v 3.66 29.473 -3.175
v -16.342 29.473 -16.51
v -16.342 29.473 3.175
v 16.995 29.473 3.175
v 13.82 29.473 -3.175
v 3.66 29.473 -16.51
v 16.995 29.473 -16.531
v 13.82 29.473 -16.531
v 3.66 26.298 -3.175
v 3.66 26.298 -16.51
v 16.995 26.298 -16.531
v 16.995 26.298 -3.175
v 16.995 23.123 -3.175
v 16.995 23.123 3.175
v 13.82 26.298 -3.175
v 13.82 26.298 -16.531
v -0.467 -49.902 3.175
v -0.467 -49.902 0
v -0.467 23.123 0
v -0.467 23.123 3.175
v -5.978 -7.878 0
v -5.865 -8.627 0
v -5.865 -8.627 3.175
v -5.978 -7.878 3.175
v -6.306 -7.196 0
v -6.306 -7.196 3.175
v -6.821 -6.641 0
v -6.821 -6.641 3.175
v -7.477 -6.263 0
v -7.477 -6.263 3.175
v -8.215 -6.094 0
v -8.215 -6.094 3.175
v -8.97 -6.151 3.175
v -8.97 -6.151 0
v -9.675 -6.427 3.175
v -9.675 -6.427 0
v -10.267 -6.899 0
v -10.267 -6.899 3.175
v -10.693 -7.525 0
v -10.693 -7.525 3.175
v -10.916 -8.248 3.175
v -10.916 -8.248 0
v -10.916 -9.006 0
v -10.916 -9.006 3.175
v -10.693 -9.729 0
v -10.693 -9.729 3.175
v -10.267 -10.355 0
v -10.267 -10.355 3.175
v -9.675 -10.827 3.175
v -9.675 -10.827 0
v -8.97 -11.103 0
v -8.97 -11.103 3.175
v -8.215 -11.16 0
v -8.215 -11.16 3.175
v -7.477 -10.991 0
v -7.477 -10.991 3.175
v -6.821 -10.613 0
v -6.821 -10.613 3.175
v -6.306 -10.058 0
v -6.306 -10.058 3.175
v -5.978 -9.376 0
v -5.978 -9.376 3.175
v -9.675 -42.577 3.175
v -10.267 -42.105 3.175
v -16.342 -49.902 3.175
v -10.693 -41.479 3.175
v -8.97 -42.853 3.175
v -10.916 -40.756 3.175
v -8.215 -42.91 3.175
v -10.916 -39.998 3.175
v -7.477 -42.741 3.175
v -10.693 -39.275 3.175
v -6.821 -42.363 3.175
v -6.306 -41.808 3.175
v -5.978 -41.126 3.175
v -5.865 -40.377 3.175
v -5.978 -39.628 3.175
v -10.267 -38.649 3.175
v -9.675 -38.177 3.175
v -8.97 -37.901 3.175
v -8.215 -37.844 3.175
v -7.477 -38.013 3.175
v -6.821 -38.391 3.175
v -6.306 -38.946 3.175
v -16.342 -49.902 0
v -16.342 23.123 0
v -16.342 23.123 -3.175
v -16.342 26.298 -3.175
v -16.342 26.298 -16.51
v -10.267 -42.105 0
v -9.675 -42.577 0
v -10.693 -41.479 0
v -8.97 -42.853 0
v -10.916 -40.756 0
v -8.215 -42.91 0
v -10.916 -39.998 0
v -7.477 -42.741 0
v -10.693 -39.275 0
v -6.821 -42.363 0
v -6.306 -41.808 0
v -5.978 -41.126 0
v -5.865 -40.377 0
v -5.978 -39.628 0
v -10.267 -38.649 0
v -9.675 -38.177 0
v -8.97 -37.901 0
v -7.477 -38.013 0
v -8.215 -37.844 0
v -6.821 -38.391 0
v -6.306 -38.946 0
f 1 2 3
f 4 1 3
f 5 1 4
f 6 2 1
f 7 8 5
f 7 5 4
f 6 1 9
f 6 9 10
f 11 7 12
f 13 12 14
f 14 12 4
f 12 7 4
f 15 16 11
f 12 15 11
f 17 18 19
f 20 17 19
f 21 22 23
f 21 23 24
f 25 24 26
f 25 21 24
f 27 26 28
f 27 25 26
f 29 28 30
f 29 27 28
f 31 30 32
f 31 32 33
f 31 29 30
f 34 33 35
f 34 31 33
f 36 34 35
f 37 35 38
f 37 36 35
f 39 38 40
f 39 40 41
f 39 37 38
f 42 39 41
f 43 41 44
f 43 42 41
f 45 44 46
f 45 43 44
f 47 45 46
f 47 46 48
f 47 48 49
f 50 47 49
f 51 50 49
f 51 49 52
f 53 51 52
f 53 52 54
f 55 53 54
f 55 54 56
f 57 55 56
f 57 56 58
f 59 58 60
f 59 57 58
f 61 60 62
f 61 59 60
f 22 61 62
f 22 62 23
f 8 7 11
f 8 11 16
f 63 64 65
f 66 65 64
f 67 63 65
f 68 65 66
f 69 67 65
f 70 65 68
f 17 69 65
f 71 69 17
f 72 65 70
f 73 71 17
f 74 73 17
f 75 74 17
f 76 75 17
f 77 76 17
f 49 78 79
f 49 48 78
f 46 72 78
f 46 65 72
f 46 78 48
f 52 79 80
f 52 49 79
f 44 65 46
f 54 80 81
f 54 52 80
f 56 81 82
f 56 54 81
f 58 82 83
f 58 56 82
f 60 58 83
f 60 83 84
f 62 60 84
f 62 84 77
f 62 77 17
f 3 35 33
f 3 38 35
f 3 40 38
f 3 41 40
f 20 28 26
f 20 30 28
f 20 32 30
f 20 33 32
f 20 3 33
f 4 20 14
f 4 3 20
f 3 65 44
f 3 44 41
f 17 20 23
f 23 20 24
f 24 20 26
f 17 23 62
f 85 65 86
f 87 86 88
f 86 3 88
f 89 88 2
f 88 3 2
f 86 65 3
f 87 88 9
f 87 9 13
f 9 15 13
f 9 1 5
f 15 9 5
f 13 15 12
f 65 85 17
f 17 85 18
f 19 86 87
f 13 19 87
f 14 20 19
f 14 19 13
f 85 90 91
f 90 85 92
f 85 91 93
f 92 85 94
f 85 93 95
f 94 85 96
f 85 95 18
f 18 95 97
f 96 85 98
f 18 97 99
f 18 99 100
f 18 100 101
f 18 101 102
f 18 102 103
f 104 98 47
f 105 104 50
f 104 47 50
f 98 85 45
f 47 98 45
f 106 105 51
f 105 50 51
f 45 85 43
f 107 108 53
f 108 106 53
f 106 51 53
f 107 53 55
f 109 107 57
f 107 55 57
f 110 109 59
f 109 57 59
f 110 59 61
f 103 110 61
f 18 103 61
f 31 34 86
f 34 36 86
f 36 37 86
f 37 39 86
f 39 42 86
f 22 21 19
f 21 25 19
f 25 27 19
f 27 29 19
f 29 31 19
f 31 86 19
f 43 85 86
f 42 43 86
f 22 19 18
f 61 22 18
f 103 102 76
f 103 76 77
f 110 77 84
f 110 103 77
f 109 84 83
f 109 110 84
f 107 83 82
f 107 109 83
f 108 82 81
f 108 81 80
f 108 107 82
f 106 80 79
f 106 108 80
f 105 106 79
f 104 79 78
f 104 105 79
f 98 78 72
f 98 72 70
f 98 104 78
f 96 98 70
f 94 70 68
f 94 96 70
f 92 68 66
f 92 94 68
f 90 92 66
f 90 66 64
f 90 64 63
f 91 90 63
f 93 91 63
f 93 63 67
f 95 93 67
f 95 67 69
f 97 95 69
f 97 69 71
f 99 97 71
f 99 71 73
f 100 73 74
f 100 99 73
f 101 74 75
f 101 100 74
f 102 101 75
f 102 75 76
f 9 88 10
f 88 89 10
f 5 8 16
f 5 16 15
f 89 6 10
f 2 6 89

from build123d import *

# Parameters (mm, degrees)
SKETCH1_W           = 15.875
SKETCH1_H           = 79.375
SKETCH1_R           = 2.54
BOSS_EXTRUDE1_DEPTH = 3.175
BOSS_EXTRUDE2_DEPTH = 3.175
SKETCH3_W           = 17.4625
SKETCH3_H           = 3.175
BOSS_EXTRUDE3_DEPTH = 3.175


with BuildPart() as part:
    # Sketch1 → Boss-Extrude1 (new body)
    with BuildSketch(Plane.XY):
        with Locations((-8.404682644, -10.214522003)):
            Rectangle(SKETCH1_W, SKETCH1_H)
        with Locations((-8.404682644, -8.627022003)):
            Circle(SKETCH1_R, mode=Mode.SUBTRACT)
        with Locations((-8.404682644, -40.377022003)):
            Circle(SKETCH1_R, mode=Mode.SUBTRACT)
    extrude(amount=BOSS_EXTRUDE1_DEPTH)

    # Sketch2 → Boss-Extrude2 (add)
    with BuildSketch(Plane(origin=(0, 29.472977997, 0), x_dir=(1, 0, 0), z_dir=(0, 1, 0))):
        Polygon((-0.467182644, 0), (3.660317356, 0), (3.660317356, 3.175), (3.660317356, 16.51), (-16.342182644, 16.51), (-16.342182644, 0), align=None)
        Polygon((16.995317356, 0), (3.660317356, 0), (-0.467182644, 0), (-0.467182644, -3.175), (16.995317356, -3.175), align=None)
        Polygon((3.660317356, 3.175), (3.660317356, 0), (16.995317356, 0), (16.995317356, 16.531210472), (13.820317356, 16.531210472), (13.820317356, 3.175), align=None)
    extrude(amount=-BOSS_EXTRUDE2_DEPTH)

    # Sketch3 → Boss-Extrude3 (add)
    with BuildSketch(Plane.XZ.offset(-26.297977997)):
        Polygon((-0.467182644, 0), (-16.342182644, 0), (-16.342182644, -3.175), (3.660317356, -3.175), (13.820317356, -3.175), (16.995317356, -3.175), (16.995317356, 0), align=None)
        with Locations((8.264067356, 1.5875)):
            Rectangle(SKETCH3_W, SKETCH3_H)
    extrude(amount=BOSS_EXTRUDE3_DEPTH)


solid = part.part
